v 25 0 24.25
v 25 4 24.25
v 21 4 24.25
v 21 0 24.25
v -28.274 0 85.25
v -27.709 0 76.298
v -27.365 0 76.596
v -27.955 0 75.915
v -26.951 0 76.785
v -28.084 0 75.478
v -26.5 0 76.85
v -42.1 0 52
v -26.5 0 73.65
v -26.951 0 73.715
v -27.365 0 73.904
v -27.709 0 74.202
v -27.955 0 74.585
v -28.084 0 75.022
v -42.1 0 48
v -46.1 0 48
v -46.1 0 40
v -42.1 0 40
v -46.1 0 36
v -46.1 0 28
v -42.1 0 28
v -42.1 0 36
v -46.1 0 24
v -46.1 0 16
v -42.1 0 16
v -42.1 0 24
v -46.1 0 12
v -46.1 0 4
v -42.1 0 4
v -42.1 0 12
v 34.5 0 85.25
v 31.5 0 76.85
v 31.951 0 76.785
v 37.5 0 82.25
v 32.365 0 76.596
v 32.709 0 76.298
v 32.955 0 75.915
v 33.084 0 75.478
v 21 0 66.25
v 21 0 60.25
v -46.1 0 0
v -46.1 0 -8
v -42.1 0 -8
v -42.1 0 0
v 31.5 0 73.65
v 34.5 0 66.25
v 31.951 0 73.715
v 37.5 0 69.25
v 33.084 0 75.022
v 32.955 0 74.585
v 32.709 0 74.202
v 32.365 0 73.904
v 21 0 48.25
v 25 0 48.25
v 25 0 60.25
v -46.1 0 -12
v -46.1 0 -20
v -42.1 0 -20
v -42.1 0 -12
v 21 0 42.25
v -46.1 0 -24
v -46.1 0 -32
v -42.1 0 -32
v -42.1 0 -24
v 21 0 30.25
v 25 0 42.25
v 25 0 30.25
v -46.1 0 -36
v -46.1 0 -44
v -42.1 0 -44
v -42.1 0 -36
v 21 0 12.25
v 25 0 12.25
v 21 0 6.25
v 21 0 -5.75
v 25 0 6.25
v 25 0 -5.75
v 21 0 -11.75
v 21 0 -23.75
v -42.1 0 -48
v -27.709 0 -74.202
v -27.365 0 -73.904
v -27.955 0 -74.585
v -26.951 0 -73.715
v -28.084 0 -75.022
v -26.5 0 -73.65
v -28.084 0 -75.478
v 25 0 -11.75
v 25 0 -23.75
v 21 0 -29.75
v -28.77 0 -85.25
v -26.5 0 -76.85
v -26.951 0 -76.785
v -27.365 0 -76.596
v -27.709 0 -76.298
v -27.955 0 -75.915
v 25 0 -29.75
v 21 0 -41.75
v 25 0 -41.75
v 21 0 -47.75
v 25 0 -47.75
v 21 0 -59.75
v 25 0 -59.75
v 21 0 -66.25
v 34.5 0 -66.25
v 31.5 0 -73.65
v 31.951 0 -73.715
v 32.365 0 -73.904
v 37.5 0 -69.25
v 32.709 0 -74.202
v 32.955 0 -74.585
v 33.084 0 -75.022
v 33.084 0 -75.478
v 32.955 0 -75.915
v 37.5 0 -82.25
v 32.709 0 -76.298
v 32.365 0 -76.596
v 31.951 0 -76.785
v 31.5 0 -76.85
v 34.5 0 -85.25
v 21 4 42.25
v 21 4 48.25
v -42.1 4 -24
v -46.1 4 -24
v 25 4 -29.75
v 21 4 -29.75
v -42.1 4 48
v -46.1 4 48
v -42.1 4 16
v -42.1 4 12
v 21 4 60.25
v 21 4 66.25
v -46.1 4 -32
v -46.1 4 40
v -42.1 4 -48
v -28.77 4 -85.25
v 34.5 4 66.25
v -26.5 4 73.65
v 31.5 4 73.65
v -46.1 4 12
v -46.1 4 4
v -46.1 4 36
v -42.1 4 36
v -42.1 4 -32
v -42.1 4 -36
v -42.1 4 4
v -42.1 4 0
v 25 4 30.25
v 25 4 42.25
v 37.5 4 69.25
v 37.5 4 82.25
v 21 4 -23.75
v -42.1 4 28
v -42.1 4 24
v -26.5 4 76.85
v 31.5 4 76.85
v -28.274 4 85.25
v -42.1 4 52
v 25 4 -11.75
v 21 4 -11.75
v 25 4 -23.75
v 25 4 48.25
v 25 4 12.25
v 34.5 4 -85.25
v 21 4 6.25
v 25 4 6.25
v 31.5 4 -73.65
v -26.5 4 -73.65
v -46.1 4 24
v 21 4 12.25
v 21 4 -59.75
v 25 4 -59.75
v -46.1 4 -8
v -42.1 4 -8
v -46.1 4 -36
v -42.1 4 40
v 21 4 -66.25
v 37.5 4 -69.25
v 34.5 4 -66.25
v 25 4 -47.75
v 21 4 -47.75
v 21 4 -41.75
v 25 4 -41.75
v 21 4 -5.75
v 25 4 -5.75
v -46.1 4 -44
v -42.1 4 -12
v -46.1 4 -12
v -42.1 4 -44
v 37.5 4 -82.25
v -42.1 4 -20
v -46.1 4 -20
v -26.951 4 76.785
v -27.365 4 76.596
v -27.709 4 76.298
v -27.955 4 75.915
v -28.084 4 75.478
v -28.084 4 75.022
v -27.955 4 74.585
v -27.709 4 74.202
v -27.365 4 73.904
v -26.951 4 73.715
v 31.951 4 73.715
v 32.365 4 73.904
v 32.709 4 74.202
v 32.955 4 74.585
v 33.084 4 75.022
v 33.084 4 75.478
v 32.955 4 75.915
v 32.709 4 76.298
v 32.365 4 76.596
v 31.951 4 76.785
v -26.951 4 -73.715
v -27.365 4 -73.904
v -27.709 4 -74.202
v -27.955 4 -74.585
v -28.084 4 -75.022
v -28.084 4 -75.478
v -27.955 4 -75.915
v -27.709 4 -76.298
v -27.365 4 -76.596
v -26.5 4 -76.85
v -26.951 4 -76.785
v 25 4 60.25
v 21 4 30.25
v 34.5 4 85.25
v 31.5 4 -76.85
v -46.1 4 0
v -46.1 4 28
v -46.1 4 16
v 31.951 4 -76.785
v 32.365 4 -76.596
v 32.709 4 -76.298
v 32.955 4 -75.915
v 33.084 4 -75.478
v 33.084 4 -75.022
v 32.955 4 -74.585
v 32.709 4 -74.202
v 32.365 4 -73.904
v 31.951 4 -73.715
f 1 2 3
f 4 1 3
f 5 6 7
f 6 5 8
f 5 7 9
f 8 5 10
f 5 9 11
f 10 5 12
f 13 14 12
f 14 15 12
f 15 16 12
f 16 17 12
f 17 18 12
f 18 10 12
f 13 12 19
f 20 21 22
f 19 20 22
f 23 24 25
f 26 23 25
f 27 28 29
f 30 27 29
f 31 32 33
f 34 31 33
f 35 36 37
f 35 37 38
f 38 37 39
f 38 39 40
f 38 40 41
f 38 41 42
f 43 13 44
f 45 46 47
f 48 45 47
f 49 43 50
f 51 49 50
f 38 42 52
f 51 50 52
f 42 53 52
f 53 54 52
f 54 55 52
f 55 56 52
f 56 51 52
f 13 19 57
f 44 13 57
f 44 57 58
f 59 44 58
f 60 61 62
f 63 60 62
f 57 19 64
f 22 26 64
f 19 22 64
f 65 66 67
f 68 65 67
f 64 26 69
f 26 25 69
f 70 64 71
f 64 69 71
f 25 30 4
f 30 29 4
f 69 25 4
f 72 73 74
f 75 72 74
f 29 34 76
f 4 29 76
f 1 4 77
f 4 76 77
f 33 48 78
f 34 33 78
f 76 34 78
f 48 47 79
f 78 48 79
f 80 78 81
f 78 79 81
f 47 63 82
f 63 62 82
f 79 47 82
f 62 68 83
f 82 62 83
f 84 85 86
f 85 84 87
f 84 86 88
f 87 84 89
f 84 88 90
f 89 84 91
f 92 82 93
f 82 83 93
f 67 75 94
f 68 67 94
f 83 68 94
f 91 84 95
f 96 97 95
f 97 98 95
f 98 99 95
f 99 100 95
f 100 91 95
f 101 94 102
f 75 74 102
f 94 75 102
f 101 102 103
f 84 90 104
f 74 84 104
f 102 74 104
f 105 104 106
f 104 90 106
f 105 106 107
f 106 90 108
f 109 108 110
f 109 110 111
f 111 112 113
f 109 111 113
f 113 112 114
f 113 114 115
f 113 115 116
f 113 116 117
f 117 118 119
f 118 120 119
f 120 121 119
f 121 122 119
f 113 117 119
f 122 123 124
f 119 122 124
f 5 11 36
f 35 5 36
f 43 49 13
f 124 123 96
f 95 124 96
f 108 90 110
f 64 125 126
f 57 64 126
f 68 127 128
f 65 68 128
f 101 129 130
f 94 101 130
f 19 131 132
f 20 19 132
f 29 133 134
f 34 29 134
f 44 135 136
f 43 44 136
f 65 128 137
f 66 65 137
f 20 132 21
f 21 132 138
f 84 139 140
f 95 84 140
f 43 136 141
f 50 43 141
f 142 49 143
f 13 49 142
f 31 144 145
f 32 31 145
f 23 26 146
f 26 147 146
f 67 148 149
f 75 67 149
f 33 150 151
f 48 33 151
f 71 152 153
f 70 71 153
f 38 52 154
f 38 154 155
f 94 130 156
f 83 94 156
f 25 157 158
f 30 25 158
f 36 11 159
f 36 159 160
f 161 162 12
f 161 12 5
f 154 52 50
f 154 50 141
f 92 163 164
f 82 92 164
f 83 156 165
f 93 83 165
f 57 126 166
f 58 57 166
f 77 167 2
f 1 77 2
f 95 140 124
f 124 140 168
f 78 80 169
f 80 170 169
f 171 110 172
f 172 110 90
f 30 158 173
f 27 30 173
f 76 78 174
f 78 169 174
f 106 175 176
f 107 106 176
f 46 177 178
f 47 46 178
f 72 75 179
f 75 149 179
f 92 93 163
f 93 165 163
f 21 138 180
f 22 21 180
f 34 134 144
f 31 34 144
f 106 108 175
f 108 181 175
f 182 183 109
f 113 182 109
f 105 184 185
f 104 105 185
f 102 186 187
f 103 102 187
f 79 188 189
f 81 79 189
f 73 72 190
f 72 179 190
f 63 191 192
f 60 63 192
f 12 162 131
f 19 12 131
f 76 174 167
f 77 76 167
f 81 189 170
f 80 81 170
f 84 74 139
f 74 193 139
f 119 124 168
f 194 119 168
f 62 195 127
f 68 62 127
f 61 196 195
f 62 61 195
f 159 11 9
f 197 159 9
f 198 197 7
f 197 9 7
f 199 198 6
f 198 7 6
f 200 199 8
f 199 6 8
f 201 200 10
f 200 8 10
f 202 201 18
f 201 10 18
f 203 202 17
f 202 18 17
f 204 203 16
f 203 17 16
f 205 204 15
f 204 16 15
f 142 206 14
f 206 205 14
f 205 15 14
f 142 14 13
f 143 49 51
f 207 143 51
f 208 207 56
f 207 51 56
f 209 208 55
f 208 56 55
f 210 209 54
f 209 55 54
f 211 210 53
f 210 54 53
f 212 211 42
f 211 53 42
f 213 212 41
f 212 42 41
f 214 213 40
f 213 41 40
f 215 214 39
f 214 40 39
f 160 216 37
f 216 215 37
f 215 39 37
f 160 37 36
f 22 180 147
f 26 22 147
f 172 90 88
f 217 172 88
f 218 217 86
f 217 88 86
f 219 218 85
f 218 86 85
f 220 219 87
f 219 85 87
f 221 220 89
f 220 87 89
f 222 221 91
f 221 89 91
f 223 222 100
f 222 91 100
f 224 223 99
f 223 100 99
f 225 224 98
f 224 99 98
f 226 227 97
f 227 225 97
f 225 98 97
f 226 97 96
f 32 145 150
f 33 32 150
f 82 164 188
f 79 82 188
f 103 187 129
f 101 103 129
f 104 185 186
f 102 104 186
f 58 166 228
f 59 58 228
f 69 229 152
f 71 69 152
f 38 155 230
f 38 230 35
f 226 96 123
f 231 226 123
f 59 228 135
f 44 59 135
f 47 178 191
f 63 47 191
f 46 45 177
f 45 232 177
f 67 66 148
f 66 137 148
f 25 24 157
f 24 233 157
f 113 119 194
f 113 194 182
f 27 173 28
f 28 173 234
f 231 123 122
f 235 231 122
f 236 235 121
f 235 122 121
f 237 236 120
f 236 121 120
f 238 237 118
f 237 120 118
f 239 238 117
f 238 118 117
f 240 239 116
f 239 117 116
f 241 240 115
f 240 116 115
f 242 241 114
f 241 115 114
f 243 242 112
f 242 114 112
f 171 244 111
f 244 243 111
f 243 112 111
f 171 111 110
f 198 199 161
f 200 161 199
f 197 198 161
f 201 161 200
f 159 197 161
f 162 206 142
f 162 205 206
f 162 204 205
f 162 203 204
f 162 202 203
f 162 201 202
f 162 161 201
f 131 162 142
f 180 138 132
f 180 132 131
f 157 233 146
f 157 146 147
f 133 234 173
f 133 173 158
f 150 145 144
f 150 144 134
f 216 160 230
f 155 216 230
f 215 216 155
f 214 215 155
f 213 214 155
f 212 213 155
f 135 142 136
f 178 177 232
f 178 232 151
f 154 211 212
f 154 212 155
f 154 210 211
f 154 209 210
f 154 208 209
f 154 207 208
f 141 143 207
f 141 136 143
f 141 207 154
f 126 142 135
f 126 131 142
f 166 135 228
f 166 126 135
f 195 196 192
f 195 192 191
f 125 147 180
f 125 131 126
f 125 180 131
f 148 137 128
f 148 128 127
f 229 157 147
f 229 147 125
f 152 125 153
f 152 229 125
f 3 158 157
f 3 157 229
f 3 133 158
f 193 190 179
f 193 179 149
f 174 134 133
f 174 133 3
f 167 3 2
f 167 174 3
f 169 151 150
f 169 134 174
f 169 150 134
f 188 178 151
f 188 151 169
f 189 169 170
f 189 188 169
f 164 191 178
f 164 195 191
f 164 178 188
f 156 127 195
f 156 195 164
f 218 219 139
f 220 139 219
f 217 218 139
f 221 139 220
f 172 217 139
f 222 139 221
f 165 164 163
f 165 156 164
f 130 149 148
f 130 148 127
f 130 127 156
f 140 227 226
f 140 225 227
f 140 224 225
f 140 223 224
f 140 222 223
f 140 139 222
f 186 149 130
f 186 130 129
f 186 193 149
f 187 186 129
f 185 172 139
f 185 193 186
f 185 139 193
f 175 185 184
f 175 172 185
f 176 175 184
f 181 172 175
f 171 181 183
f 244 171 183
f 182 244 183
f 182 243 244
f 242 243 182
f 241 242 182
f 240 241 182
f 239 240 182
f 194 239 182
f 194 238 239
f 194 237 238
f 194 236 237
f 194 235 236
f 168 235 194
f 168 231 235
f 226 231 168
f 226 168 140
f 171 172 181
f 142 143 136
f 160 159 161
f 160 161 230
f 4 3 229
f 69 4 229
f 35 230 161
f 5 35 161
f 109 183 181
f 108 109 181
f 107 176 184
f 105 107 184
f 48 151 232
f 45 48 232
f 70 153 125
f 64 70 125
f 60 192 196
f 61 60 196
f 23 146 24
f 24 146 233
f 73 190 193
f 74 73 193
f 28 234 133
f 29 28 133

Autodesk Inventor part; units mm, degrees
ref_plane "YZ Plane" through (0, 0, 0) normal (1, 0, 0) x (0, 1, 0)
ref_plane "XZ Plane" through (0, 0, 0) normal (0, 1, 0) x (-1, 0, 0)
ref_plane "XY Plane" through (0, 0, 0) normal (0, 0, 1) x (1, 0, 0)
sketch "Эскиз1" plane through (0, 0, 0) normal (0, 1, 0) x (-1, 0, 0)
  line L0 (-37.5, 85.25) -> (37.5, 85.25)
  line L1 (37.5, 85.25) -> (37.5, -85.25)
  line L2 (37.5, -85.25) -> (-37.5, -85.25)
  line L3 (-37.5, -85.25) -> (-37.5, 85.25)
  line L4 (-37.5, 85.25) -> (37.5, -85.25) construction
  line L5 (37.5, 85.25) -> (-37.5, -85.25) construction
  circle A0 centre (21.5, 75.25) radius 1.6 construction
  circle A1 centre (-26.5, 75.25) radius 1.6 construction
  line L6 (37.5, 0) -> (0, 0) construction
  line L7 (-37.5, -85.25) -> (37.5, 85.25) construction
  circle A2 centre (21.5, -75.25) radius 1.6 construction
  circle A3 centre (-26.5, -75.25) radius 1.6 construction
  line L8 (37.5, 75.25) -> (-37.5, 75.25) construction
  line L9 (28.1, 75.25) -> (-33.1, 75.25) construction
  line L10 (26.5, 76.85) -> (-31.5, 76.85)
  line L11 (-31.5, 73.65) -> (26.5, 73.65)
  arc A4 (26.5, 73.65) -> (26.5, 76.85) centre (26.5, 75.25) ccw
  arc A5 (-31.5, 76.85) -> (-31.5, 73.65) centre (-31.5, 75.25) ccw
  line L12 (26.5, -76.85) -> (-31.5, -76.85)
  line L13 (-31.5, -73.65) -> (26.5, -73.65)
  arc A6 (26.5, -76.85) -> (26.5, -73.65) centre (26.5, -75.25) ccw
  arc A7 (-31.5, -73.65) -> (-31.5, -76.85) centre (-31.5, -75.25) ccw
  point P0 (-2.5, 75.25)
  point P1 (-33.1, -75.25)
  dimension "d0" = 170.5
  dimension "d1" = 75
  dimension "d2" = 3.2
  dimension "d4" = 10
  dimension "d5" = 3.2
  dimension "d7" = 10
  dimension "d29" = 48
  dimension "d30" = 3.2
  dimension "d32" = 5
  dimension "d33" = 5
  dimension "d59" = 6
  dimension "d60" = 10
extrude "Выдавливание1" add sketch "Эскиз1" along normal blind 4
sketch "Эскиз2" plane through (0, 4, 0) normal (0, 1, 0) x (1, 0, 0)
  line L0 (33, 66.25) -> (33, -66.25) construction
  line L1 (-37.5, -85.25) -> (37.5, -85.25) projected
  line L2 (37.5, 85.25) -> (-37.5, 85.25) projected
  line L3 (21, -66.25) -> (25, -66.25)
  line L4 (25, -66.25) -> (25, -60.25)
  line L5 (25, -60.25) -> (21, -60.25)
  line L6 (21, -60.25) -> (21, -66.25)
  line L7 (21, -48.25) -> (25, -48.25)
  line L8 (21, -42.25) -> (21, -48.25)
  line L9 (25, -48.25) -> (25, -42.25)
  line L10 (25, -42.25) -> (21, -42.25)
  line L11 (21, -30.25) -> (25, -30.25)
  line L12 (21, -24.25) -> (21, -30.25)
  line L13 (25, -30.25) -> (25, -24.25)
  line L14 (25, -24.25) -> (21, -24.25)
  line L15 (21, -12.25) -> (25, -12.25)
  line L16 (21, -6.25) -> (21, -12.25)
  line L17 (25, -12.25) -> (25, -6.25)
  line L18 (25, -6.25) -> (21, -6.25)
  line L19 (21, 5.75) -> (25, 5.75)
  line L20 (21, 11.75) -> (21, 5.75)
  line L21 (25, 5.75) -> (25, 11.75)
  line L22 (25, 11.75) -> (21, 11.75)
  line L23 (21, 23.75) -> (25, 23.75)
  line L24 (21, 29.75) -> (21, 23.75)
  line L25 (25, 23.75) -> (25, 29.75)
  line L26 (25, 29.75) -> (21, 29.75)
  line L27 (21, 41.75) -> (25, 41.75)
  line L28 (21, 47.75) -> (21, 41.75)
  line L29 (25, 41.75) -> (25, 47.75)
  line L30 (25, 47.75) -> (21, 47.75)
  line L31 (21, 59.75) -> (25, 59.75)
  line L32 (25, 59.75) -> (25, 66.25)
  line L33 (25, 66.25) -> (21, 66.25)
  line L34 (21, 66.25) -> (21, 59.75)
  point P0 (27, -66.25)
  dimension "d14" = 19
  dimension "d16" = 4
  dimension "d17" = 6
  dimension "d20" = 18
  dimension "d34" = 4
  dimension "d35" = 6.5
  dimension "d36" = 12
extrude "Выдавливание2" cut sketch "Эскиз2" against normal blind 10
sketch "Эскиз3" plane through (0, 4, 0) normal (0, 1, 0) x (1, 0, 0)
  line L0 (37.5, -85.25) -> (37.5, 85.25) projected
  line L1 (37.5, 66.25) -> (25, 66.25)
  line L2 (25, 66.25) -> (25, -66.25)
  line L3 (25, -66.25) -> (37.5, -66.25)
  line L4 (37.5, -66.25) -> (37.5, 66.25)
  line L5 (-26.5, -73.65) -> (31.5, -73.65) projected
  line L6 (31.5, 73.65) -> (-26.5, 73.65) projected
  line L7 (25, -24.25) -> (25, -30.25) projected
  point P0 (0, 0)
  point P1 (31.25, 66.25)
  point P2 (25, -27.25)
  point P3 (37.5, -66.25)
  point P4 (25, -66.25)
  point P5 (25, 66.25)
  dimension "d39" = 0
extrude "Выдавливание3" cut sketch "Эскиз3" against normal blind 10
chamfer "Фаска1" distance 3 angle 45 4 edges at (37.5, 2, 66.25) (37.5, 2, -66.25) (37.5, 2, -85.25) (37.5, 2, 85.25)
sketch "Эскиз5" plane through (0, 4, 0) normal (0, 1, 0) x (1, 0, 0)
  line L0 (-37.5, 85.25) -> (-37.5, -85.25) projected
  line L1 (-37.5, -85.25) -> (-46.1, -85.25)
  line L2 (-46.1, -85.25) -> (-46.1, 85.25)
  line L3 (-46.1, 85.25) -> (-37.5, 85.25)
  line L4 (-37.5, 85.25) -> (-37.5, -85.25)
  point P0 (0, 0)
  dimension "d61" = 8.6
extrude "Выдавливание5" add sketch "Эскиз5" against normal blind 4
sketch "Эскиз6" plane through (0, 4, 0) normal (0, 1, 0) x (1, 0, 0)
  line L0 (-46.1, -60) -> (-42.1, -60) construction
  line L1 (-42.1, 60) -> (-46.1, 60) construction
  line L2 (-46.1, 60) -> (-46.1, -60) construction
  line L3 (-46.1, -60) -> (-42.1, 60) construction
  line L4 (-42.1, -60) -> (-46.1, 60) construction
  line L5 (-46.1, 85.25) -> (-46.1, -85.25) construction
  line L6 (-42.1, -48) -> (-46.1, -48)
  line L7 (-46.1, -48) -> (-46.1, -52)
  line L8 (-46.1, -52) -> (-42.1, -52)
  line L9 (-42.1, -52) -> (-42.1, -48)
  line L10 (-42.1, -40) -> (-42.1, -36)
  line L11 (-46.1, -40) -> (-42.1, -40)
  line L12 (-46.1, -36) -> (-46.1, -40)
  line L13 (-42.1, -36) -> (-46.1, -36)
  line L14 (-42.1, -28) -> (-42.1, -24)
  line L15 (-46.1, -28) -> (-42.1, -28)
  line L16 (-46.1, -24) -> (-46.1, -28)
  line L17 (-42.1, -24) -> (-46.1, -24)
  line L18 (-42.1, -16) -> (-42.1, -12)
  line L19 (-46.1, -16) -> (-42.1, -16)
  line L20 (-46.1, -12) -> (-46.1, -16)
  line L21 (-42.1, -12) -> (-46.1, -12)
  line L22 (-42.1, -4) -> (-42.1, 0)
  line L23 (-46.1, -4) -> (-42.1, -4)
  line L24 (-46.1, 0) -> (-46.1, -4)
  line L25 (-42.1, 0) -> (-46.1, 0)
  line L26 (-42.1, 8) -> (-42.1, 12)
  line L27 (-46.1, 8) -> (-42.1, 8)
  line L28 (-46.1, 12) -> (-46.1, 8)
  line L29 (-42.1, 12) -> (-46.1, 12)
  line L30 (-42.1, 20) -> (-42.1, 24)
  line L31 (-46.1, 20) -> (-42.1, 20)
  line L32 (-46.1, 24) -> (-46.1, 20)
  line L33 (-42.1, 24) -> (-46.1, 24)
  line L34 (-42.1, 32) -> (-42.1, 36)
  line L35 (-46.1, 32) -> (-42.1, 32)
  line L36 (-46.1, 36) -> (-46.1, 32)
  line L37 (-42.1, 36) -> (-46.1, 36)
  line L38 (-42.1, 44) -> (-42.1, 48)
  line L39 (-46.1, 44) -> (-42.1, 44)
  line L40 (-46.1, 48) -> (-46.1, 44)
  line L41 (-42.1, 48) -> (-46.1, 48)
  point P0 (0, 0)
  point P1 (-44.1, 0)
  point P2 (-46.1, 0)
  dimension "d64" = 4
  dimension "d65" = 120
  dimension "d66" = 4
  dimension "d67" = 4
  dimension "d68" = 8
  dimension "d71" = 12
extrude "Выдавливание6" cut sketch "Эскиз6" against normal blind 4
sketch "Эскиз7" plane through (0, 4, 0) normal (0, 1, 0) x (1, 0, 0)
  line L0 (-42.1, -52) -> (-42.1, -48) projected
  line L1 (-42.1, -52) -> (-28.2738, -85.25)
  line L2 (34.5, -85.25) -> (-46.1, -85.25) projected
  line L3 (-46.1, -52) -> (-46.1, -85.25) projected
  line L4 (-46.1, -85.25) -> (-28.2738, -85.25)
  line L5 (-46.1, -85.25) -> (-46.1, -52)
  line L6 (-46.1, -52) -> (-42.1, -52)
  arc A0 (-26.5, -73.65) -> (-26.5, -76.85) centre (-26.5, -75.25) ccw projected
  line L7 (0, 0) -> (-4.0175, 0)
  line L8 (-42.1, 48) -> (-42.1, 44) projected
  line L9 (-42.1, 48) -> (-28.7698, 85.25)
  line L10 (34.5, 85.25) -> (-46.1, 85.25) projected
  line L11 (-46.1, 85.25) -> (-28.7698, 85.25)
  line L12 (-46.1, 85.25) -> (-46.1, 48)
  line L13 (-46.1, 48) -> (-42.1, 48)
  arc A1 (-26.5, 76.85) -> (-26.5, 73.65) centre (-26.5, 75.25) ccw projected
  point P0 (-28.1, -75.25)
  point P1 (-28.1, 75.25)
  dimension "d78" = 4
  dimension "d81" = 4
extrude "Выдавливание7" cut sketch "Эскиз7" against normal blind 4
properties part number "ребро_электроника"
